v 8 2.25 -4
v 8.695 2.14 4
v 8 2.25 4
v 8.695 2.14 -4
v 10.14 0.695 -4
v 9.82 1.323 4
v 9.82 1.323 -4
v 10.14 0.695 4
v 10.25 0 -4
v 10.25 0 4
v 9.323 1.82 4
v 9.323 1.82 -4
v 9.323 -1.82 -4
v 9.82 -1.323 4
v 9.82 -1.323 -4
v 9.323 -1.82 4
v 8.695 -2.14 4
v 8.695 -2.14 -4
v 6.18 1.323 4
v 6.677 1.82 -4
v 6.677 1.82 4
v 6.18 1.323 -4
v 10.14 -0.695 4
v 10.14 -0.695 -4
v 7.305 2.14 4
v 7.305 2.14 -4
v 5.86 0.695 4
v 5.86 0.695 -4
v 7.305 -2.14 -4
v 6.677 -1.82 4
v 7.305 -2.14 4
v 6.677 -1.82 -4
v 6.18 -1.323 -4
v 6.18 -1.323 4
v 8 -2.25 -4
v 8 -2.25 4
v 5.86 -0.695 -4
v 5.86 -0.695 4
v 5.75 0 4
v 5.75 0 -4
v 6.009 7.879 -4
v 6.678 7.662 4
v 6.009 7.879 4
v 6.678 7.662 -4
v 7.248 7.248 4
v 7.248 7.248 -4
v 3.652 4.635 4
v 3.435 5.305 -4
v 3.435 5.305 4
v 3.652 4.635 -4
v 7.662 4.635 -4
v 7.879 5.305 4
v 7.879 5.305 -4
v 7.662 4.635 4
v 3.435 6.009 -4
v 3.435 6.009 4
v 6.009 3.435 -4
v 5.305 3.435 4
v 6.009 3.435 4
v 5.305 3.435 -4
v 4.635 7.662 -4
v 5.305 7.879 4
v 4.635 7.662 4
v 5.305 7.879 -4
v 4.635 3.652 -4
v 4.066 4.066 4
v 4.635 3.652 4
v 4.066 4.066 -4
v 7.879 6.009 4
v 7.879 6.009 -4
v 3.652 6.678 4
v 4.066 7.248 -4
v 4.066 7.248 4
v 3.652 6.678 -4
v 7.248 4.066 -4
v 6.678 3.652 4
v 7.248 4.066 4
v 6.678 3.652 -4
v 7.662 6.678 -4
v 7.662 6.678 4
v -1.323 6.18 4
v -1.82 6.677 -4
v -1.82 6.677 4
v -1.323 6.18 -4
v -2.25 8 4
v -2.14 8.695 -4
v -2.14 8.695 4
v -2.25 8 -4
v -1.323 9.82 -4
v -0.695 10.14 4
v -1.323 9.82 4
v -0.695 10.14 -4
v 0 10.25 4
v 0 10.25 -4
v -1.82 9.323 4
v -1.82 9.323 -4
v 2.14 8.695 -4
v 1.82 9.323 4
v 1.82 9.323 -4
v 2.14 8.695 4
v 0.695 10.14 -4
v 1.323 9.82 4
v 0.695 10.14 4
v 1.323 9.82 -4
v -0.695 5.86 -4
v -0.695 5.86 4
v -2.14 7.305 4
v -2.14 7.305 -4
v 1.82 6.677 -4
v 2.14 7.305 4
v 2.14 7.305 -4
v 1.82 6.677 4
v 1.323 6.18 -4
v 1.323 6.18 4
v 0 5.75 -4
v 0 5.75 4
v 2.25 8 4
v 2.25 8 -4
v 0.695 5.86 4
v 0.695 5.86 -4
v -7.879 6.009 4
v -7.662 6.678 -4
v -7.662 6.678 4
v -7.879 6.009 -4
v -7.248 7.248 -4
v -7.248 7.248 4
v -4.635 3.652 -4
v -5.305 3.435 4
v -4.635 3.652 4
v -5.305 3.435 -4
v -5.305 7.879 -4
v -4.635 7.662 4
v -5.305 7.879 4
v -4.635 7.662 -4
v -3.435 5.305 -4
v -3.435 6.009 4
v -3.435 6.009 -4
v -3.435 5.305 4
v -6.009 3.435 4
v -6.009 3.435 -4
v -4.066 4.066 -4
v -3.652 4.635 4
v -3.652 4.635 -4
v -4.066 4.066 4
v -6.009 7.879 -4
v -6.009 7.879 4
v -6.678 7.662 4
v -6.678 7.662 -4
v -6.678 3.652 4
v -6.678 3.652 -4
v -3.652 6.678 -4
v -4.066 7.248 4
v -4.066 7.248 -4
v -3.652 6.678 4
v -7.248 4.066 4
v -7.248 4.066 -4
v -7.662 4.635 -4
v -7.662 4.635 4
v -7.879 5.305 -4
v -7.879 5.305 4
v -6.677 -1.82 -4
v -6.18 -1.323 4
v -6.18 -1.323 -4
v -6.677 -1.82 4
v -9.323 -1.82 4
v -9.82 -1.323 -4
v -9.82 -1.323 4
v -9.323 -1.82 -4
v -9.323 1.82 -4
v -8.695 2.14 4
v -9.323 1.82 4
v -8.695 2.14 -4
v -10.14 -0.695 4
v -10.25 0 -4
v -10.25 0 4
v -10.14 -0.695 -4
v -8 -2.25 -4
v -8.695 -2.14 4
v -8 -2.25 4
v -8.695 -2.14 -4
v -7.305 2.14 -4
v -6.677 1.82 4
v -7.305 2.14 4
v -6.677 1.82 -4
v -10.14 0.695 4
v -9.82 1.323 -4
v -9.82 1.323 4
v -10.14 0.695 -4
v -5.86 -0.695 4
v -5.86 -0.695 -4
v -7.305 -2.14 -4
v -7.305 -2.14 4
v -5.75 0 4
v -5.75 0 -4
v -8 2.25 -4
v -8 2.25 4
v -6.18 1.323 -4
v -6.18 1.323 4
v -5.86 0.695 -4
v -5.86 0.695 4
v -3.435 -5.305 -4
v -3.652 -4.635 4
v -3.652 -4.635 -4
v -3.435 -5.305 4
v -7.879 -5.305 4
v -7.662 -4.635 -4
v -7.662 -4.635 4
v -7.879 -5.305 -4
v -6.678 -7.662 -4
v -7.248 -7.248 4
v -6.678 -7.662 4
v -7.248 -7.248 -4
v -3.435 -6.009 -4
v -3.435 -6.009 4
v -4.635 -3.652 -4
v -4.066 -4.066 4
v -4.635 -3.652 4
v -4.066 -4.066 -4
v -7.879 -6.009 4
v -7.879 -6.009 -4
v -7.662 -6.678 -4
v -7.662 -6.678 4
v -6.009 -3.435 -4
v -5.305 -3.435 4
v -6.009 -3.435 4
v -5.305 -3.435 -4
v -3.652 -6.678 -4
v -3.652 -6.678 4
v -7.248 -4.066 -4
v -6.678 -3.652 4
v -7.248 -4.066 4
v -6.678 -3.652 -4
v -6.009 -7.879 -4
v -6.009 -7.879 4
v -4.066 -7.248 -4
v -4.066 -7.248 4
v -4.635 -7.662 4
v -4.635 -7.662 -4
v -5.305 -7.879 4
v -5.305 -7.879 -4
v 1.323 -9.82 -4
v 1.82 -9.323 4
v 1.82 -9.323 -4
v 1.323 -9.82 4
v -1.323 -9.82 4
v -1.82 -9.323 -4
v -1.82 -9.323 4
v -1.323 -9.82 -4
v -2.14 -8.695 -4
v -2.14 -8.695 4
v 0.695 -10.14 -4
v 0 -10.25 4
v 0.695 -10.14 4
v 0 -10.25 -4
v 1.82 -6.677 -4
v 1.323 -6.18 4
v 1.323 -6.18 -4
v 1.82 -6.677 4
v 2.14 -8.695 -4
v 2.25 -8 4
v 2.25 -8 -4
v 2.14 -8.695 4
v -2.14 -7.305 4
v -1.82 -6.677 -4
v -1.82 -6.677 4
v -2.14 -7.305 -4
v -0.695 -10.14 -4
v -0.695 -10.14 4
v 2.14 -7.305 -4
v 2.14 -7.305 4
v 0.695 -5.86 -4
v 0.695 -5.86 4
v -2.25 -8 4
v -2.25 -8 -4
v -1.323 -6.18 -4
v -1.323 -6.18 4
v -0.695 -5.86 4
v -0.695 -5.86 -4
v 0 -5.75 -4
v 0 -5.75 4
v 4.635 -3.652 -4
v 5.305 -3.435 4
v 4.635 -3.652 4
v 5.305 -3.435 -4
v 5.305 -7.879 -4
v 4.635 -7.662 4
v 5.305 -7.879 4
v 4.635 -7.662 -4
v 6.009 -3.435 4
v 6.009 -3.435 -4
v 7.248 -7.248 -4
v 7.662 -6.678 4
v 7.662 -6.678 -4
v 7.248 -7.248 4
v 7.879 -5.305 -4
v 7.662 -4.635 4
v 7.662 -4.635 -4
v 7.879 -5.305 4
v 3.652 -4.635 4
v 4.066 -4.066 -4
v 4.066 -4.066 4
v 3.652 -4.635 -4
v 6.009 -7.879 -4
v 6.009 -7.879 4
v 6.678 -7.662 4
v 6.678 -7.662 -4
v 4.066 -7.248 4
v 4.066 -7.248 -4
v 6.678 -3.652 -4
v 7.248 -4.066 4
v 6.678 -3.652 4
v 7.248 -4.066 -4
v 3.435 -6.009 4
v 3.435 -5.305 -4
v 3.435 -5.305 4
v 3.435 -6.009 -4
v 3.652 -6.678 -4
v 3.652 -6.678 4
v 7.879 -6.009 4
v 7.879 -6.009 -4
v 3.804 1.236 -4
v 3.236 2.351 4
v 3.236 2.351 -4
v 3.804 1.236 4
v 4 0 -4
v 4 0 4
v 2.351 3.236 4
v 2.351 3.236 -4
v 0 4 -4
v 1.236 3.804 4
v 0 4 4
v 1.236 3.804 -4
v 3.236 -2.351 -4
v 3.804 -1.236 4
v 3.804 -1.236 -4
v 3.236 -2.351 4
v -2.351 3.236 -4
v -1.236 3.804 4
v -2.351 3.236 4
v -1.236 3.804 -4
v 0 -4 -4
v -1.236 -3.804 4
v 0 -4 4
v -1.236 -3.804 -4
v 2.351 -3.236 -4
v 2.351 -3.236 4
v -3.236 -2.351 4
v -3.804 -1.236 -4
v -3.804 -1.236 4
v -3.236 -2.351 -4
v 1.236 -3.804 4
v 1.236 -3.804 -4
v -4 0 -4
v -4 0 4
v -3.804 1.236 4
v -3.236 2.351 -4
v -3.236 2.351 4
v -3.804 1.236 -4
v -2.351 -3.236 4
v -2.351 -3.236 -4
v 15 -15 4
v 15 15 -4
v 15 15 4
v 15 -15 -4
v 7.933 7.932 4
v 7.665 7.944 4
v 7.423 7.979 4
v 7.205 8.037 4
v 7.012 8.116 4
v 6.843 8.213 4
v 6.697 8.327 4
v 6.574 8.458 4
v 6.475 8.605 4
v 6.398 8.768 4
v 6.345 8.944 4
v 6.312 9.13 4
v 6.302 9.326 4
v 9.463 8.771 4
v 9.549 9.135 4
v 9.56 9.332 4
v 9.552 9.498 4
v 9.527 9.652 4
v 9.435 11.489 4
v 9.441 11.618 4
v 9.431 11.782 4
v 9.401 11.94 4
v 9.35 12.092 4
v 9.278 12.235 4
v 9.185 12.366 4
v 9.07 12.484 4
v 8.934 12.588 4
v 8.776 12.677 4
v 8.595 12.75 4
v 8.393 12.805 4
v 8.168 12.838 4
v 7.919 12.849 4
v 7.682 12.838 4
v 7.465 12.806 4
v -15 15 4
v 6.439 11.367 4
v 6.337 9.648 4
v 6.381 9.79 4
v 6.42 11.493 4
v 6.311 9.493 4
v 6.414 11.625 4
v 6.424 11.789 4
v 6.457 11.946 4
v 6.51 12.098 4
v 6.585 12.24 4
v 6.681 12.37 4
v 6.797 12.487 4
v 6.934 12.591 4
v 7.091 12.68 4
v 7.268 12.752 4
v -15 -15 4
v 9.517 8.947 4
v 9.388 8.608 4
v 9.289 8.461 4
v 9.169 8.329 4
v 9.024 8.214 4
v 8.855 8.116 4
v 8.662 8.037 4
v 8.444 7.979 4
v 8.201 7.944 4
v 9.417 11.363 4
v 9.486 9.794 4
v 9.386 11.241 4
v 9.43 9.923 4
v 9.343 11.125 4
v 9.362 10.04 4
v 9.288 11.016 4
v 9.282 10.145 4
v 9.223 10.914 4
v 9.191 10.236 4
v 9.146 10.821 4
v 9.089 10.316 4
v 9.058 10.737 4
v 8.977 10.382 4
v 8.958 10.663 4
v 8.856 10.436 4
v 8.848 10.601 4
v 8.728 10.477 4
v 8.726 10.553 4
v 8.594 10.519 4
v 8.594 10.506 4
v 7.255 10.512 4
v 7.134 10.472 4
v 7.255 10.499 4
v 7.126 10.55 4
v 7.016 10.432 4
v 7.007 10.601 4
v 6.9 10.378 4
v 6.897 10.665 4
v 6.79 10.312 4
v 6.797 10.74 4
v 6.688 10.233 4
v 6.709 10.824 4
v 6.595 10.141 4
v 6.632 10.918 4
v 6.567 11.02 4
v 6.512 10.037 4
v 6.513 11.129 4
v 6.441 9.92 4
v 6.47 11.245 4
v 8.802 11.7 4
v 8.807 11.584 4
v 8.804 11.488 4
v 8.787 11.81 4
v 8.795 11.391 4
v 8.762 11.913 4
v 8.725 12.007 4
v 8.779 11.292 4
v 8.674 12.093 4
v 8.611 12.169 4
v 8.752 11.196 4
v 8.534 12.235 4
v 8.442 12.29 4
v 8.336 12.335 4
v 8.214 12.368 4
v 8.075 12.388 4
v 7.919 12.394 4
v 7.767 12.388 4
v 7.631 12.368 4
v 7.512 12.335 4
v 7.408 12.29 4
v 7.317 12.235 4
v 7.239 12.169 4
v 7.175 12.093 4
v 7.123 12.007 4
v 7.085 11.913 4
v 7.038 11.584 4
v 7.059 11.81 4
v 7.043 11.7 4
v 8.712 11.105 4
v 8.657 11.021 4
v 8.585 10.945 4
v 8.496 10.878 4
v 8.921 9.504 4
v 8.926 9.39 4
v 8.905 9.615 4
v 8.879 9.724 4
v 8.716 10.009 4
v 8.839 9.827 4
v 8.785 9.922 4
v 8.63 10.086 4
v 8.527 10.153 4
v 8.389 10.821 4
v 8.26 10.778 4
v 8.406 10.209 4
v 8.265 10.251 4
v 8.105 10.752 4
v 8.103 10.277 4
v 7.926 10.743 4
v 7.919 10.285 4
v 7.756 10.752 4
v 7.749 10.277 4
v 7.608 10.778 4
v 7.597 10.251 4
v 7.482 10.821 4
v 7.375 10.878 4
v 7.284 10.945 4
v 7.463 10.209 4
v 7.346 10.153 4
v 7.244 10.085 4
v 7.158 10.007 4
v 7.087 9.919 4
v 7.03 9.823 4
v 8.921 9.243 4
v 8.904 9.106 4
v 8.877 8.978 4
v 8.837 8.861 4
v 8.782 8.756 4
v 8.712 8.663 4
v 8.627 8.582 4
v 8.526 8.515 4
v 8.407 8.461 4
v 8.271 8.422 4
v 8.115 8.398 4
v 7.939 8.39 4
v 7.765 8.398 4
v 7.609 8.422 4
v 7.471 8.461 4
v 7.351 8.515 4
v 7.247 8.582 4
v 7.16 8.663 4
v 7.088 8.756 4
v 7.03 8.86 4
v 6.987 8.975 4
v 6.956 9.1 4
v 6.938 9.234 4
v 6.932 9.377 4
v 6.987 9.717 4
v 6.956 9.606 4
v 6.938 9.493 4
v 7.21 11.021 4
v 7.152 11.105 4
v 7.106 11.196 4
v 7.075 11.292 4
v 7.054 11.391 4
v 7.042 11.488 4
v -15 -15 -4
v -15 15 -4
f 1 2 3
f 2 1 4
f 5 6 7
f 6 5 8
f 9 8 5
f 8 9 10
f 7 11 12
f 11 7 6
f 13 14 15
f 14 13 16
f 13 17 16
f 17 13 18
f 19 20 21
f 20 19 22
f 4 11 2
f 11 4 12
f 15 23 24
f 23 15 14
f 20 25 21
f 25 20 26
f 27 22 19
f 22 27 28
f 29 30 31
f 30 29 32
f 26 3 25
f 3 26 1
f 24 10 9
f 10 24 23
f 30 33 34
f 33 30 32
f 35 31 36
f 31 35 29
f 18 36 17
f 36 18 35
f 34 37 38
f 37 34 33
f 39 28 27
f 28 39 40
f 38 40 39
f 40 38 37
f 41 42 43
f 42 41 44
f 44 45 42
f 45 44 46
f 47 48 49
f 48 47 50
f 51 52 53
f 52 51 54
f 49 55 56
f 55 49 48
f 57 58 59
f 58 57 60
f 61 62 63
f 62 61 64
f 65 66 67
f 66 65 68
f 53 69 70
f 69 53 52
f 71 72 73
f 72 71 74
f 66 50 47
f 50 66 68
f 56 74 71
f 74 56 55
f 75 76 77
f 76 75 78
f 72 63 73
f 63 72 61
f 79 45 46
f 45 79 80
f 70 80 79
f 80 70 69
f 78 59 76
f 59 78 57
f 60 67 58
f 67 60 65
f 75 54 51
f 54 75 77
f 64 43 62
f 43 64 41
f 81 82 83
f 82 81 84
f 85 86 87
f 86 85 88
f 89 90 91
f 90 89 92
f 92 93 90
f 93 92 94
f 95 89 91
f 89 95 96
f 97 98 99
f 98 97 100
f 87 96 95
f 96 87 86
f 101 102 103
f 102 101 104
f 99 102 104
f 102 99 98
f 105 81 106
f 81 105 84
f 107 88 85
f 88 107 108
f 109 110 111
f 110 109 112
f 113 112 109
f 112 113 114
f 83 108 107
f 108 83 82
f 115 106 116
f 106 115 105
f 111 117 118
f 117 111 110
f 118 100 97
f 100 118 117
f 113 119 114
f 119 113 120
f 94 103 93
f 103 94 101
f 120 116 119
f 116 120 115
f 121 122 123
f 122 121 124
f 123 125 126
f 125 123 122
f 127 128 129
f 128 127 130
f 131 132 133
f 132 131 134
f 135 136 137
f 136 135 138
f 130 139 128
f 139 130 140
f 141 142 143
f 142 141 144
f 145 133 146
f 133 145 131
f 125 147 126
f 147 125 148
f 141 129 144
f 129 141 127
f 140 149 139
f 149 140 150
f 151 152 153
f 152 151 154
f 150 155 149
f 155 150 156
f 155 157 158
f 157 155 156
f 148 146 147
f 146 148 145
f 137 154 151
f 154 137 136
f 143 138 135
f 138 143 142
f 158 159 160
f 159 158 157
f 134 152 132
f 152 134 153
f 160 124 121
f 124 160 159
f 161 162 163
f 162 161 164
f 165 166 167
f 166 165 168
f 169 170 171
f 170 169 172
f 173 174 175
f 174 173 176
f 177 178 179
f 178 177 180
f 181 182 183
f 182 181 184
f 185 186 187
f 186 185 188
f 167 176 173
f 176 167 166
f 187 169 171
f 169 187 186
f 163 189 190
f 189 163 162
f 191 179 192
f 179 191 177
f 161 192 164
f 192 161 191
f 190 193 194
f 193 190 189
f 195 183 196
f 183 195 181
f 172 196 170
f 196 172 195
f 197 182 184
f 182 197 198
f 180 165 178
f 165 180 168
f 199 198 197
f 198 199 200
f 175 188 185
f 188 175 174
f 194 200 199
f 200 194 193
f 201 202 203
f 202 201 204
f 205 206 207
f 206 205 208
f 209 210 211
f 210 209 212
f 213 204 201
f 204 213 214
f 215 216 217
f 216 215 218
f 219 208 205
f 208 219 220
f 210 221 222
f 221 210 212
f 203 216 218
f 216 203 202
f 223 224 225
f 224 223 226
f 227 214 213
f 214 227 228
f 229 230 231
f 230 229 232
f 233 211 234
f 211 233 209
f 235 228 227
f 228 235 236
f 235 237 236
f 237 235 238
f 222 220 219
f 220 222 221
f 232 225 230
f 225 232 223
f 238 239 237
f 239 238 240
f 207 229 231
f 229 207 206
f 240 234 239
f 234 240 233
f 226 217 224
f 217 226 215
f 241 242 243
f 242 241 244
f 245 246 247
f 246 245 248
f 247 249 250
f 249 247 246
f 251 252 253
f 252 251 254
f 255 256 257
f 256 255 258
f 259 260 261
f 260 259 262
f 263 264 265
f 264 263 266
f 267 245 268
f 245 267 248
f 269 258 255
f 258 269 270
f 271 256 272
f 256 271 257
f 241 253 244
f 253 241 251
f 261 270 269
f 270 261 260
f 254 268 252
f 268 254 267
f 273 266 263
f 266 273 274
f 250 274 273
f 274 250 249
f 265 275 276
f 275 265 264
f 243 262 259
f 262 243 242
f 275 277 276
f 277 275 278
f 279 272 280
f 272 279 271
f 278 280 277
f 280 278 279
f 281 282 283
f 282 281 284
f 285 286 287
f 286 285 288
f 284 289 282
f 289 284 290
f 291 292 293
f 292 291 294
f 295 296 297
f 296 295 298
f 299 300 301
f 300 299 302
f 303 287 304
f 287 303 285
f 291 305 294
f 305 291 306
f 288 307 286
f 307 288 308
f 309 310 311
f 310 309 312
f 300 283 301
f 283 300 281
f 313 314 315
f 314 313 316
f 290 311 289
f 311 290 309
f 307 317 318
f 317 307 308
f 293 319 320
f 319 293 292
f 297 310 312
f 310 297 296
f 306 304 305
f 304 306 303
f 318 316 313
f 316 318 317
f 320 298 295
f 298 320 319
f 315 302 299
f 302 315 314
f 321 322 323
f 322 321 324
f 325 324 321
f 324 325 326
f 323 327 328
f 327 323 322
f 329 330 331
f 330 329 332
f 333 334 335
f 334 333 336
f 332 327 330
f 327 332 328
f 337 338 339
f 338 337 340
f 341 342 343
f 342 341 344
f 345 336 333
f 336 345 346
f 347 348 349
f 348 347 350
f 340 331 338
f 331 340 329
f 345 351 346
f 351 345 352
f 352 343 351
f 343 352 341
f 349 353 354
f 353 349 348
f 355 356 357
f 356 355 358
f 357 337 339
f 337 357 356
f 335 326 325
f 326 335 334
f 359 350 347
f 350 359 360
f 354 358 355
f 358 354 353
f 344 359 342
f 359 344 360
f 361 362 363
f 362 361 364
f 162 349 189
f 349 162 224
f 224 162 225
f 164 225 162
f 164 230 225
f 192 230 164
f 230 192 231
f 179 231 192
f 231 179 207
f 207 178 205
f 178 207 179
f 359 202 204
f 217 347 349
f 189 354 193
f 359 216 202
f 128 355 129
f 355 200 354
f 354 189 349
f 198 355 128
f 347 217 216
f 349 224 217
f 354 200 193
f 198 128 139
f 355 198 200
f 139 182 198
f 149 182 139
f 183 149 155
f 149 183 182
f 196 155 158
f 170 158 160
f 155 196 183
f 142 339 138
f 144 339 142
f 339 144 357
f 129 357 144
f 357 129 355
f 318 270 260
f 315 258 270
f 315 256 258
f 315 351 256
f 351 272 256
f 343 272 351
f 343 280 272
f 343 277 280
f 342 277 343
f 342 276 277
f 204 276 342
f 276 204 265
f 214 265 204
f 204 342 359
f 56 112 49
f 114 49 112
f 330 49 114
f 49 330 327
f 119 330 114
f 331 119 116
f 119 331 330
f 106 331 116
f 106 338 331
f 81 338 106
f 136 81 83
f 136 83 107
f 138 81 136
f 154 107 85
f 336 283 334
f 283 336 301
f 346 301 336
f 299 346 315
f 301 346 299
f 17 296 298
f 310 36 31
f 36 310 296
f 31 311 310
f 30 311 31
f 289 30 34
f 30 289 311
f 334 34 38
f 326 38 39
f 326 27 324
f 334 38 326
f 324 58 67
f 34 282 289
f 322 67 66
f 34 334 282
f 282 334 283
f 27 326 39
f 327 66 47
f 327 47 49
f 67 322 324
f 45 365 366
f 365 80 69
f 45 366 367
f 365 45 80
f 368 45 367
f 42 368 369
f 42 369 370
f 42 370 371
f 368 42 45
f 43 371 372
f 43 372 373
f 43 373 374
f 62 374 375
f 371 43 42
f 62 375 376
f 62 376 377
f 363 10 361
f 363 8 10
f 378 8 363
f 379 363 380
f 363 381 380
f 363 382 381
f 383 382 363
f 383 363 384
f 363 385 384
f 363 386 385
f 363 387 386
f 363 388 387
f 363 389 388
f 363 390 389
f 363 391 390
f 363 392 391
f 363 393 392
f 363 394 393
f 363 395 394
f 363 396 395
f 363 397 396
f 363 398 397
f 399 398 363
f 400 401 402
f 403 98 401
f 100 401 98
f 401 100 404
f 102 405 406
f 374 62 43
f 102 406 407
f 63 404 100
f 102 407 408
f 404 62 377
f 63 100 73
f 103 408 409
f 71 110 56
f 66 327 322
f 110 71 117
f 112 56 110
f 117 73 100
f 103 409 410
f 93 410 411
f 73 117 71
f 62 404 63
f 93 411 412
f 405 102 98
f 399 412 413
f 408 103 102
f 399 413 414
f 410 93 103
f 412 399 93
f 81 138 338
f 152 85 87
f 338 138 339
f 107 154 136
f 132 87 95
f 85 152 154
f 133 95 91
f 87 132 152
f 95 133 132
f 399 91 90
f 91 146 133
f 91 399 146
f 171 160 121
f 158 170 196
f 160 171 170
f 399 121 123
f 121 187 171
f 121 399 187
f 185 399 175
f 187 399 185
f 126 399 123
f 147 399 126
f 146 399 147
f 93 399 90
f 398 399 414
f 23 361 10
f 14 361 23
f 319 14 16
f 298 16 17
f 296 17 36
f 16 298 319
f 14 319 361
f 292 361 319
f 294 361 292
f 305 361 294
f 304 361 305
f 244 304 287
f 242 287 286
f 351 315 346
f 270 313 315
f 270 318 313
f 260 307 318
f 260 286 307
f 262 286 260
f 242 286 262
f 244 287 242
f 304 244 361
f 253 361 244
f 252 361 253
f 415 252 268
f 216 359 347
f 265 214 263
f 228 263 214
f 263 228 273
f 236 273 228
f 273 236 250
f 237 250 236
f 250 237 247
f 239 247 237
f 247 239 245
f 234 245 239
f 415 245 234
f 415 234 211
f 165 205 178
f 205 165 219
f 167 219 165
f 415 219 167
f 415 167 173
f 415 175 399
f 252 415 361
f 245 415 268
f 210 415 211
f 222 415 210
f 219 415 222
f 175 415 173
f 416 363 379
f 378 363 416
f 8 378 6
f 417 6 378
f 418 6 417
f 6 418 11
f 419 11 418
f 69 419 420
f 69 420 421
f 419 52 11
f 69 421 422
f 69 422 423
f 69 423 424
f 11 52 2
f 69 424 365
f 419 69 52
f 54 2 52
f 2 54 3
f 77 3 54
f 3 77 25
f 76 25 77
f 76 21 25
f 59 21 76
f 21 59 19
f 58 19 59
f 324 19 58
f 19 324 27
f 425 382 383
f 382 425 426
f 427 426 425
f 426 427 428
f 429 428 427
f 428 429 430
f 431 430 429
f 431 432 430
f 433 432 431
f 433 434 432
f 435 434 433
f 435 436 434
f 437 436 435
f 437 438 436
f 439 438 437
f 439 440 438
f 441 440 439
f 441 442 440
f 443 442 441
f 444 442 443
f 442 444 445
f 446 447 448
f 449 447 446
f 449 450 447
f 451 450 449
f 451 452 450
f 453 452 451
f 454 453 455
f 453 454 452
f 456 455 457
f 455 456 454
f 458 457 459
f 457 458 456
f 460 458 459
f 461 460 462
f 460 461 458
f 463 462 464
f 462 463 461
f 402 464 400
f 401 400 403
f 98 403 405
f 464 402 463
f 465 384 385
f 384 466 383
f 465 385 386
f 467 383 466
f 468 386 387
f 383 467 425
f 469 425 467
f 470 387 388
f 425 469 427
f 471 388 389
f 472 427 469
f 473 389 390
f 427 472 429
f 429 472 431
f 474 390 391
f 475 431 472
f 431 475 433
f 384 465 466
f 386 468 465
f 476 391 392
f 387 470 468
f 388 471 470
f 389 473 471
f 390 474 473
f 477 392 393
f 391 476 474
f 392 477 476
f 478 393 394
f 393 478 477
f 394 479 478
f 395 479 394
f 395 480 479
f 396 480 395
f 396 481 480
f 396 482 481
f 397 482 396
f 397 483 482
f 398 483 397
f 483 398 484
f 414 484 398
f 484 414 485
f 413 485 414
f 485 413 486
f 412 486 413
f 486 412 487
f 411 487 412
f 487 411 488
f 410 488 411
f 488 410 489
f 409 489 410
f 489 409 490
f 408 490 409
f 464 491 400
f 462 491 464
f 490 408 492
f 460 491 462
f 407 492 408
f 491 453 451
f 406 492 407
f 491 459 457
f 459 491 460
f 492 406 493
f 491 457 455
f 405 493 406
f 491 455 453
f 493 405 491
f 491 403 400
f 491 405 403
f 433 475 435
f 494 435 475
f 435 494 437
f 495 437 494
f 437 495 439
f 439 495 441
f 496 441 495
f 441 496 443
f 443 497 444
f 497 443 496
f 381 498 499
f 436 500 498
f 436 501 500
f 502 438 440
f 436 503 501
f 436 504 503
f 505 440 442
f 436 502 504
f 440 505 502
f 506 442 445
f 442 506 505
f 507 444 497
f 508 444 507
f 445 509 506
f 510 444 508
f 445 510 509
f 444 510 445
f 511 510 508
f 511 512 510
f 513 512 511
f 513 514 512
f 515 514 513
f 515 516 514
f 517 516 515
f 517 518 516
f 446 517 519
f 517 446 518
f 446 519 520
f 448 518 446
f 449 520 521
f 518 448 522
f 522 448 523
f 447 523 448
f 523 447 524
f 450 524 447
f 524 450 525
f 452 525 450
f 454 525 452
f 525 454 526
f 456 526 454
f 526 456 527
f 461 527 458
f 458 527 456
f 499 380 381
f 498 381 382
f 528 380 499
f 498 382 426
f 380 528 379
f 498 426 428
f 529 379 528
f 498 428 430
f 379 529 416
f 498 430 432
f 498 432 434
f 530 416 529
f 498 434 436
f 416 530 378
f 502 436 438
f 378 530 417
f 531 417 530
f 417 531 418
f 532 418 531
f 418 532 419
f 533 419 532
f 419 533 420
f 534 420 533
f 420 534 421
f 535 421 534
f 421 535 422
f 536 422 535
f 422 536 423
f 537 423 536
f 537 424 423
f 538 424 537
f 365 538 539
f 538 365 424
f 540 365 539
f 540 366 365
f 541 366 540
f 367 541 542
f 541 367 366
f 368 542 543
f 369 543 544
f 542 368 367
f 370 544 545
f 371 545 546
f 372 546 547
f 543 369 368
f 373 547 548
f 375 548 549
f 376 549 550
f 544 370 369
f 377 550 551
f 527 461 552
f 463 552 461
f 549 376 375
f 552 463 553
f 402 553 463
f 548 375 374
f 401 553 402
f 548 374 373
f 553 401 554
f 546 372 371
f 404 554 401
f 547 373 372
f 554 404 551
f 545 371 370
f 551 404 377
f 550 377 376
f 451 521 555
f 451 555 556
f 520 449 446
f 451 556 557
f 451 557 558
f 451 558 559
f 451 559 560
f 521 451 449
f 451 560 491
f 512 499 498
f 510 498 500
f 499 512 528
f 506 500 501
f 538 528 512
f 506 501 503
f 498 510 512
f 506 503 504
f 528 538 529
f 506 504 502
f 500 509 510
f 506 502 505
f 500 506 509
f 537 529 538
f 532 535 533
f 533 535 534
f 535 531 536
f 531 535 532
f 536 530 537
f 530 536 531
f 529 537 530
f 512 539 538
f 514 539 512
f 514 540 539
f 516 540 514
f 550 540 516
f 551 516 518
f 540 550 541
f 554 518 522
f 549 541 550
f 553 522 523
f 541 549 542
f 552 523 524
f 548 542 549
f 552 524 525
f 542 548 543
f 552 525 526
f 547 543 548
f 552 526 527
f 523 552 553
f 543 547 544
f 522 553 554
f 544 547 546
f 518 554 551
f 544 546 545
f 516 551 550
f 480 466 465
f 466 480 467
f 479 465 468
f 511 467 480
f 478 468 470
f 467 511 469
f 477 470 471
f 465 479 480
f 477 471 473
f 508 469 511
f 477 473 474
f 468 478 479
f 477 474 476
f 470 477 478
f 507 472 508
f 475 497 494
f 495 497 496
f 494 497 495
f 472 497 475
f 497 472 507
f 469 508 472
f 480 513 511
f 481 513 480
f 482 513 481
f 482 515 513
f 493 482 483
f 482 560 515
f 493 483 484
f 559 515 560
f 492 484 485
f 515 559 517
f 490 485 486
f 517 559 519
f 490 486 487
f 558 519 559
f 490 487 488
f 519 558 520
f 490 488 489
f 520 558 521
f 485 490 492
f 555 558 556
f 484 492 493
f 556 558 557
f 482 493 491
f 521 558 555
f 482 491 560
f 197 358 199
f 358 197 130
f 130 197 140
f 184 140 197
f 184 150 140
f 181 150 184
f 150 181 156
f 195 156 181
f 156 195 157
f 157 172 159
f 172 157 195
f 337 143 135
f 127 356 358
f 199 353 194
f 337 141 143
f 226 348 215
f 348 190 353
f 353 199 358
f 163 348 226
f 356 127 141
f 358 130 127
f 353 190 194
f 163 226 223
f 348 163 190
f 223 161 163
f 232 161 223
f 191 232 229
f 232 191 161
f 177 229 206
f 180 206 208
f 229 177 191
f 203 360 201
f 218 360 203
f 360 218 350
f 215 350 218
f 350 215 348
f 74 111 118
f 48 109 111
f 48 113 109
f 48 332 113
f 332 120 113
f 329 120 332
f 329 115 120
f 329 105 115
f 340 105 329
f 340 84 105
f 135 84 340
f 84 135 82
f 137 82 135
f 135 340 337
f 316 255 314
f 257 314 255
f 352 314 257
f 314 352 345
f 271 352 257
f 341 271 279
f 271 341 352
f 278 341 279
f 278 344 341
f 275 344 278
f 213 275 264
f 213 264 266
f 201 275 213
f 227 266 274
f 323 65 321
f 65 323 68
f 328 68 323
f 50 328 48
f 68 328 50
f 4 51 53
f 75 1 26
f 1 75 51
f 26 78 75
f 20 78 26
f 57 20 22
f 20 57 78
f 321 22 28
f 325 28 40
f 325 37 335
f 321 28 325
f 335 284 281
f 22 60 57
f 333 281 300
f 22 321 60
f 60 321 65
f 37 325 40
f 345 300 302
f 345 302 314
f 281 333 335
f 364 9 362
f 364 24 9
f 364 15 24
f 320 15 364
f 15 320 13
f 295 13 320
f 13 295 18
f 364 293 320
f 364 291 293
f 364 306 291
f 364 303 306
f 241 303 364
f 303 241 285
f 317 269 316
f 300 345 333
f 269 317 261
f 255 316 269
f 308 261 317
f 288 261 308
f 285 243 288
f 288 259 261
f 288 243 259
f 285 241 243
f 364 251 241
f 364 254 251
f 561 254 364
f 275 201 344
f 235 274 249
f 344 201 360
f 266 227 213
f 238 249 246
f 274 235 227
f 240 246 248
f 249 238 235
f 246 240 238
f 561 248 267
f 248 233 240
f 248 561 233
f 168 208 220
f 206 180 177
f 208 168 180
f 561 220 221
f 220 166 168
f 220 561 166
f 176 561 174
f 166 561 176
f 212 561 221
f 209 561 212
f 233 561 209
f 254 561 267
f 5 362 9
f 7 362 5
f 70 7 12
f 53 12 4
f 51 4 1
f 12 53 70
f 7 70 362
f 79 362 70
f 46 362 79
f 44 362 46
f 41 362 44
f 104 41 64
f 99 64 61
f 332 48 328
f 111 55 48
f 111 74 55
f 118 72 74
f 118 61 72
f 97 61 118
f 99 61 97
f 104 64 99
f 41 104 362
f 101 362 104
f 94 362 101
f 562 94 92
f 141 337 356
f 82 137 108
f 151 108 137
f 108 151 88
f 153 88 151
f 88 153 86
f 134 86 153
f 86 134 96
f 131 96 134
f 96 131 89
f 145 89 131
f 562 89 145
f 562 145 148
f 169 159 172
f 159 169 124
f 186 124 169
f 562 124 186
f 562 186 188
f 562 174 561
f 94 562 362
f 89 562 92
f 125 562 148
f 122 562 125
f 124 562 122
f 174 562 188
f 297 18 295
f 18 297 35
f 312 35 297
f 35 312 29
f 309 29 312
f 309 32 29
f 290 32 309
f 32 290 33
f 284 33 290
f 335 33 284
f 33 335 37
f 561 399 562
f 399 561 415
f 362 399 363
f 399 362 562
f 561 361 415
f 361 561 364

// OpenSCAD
//Parametric Spacer block for FTC
//Alissa Jurisch
//11/28/2017
//rev 2


//thickness of spacer in mm
x=8; //thickness of spacer in mm


module screw_hole(){
translate([8,0,-32.5]){
    cylinder(d=4.5,h=65, $fn=20);
}
}
module hub(){
    translate ([0,0,-32.5]) {
    cylinder(d=8, h=65, $fn=20);
}
}
 // creates screw and hub holes 
module flower(){
for (i=[0 :45: 360]) //90 for 4 holes 45 for 8 holes.
    rotate(i,[0,0,1]){
screw_hole();
    }
    
hub();    
}
//creates a spindle with one side open for chain pulley
module pulley(){  
    cylinder (d=25,h=14, $fn=60, center=true);
    translate([0,0,-7]){
    cylinder (d=50,h=3, $fn=60, center=true);
}}


//spacer with holes cut out
     difference(){
    cube ([30,30,x], center=true); //30mm is just under the 32mm the tetrix block size
         flower();
         translate([6,8,x/2])
    linear_extrude(5)
        text(str(x), size = 5); //converts thickness into text
     }
